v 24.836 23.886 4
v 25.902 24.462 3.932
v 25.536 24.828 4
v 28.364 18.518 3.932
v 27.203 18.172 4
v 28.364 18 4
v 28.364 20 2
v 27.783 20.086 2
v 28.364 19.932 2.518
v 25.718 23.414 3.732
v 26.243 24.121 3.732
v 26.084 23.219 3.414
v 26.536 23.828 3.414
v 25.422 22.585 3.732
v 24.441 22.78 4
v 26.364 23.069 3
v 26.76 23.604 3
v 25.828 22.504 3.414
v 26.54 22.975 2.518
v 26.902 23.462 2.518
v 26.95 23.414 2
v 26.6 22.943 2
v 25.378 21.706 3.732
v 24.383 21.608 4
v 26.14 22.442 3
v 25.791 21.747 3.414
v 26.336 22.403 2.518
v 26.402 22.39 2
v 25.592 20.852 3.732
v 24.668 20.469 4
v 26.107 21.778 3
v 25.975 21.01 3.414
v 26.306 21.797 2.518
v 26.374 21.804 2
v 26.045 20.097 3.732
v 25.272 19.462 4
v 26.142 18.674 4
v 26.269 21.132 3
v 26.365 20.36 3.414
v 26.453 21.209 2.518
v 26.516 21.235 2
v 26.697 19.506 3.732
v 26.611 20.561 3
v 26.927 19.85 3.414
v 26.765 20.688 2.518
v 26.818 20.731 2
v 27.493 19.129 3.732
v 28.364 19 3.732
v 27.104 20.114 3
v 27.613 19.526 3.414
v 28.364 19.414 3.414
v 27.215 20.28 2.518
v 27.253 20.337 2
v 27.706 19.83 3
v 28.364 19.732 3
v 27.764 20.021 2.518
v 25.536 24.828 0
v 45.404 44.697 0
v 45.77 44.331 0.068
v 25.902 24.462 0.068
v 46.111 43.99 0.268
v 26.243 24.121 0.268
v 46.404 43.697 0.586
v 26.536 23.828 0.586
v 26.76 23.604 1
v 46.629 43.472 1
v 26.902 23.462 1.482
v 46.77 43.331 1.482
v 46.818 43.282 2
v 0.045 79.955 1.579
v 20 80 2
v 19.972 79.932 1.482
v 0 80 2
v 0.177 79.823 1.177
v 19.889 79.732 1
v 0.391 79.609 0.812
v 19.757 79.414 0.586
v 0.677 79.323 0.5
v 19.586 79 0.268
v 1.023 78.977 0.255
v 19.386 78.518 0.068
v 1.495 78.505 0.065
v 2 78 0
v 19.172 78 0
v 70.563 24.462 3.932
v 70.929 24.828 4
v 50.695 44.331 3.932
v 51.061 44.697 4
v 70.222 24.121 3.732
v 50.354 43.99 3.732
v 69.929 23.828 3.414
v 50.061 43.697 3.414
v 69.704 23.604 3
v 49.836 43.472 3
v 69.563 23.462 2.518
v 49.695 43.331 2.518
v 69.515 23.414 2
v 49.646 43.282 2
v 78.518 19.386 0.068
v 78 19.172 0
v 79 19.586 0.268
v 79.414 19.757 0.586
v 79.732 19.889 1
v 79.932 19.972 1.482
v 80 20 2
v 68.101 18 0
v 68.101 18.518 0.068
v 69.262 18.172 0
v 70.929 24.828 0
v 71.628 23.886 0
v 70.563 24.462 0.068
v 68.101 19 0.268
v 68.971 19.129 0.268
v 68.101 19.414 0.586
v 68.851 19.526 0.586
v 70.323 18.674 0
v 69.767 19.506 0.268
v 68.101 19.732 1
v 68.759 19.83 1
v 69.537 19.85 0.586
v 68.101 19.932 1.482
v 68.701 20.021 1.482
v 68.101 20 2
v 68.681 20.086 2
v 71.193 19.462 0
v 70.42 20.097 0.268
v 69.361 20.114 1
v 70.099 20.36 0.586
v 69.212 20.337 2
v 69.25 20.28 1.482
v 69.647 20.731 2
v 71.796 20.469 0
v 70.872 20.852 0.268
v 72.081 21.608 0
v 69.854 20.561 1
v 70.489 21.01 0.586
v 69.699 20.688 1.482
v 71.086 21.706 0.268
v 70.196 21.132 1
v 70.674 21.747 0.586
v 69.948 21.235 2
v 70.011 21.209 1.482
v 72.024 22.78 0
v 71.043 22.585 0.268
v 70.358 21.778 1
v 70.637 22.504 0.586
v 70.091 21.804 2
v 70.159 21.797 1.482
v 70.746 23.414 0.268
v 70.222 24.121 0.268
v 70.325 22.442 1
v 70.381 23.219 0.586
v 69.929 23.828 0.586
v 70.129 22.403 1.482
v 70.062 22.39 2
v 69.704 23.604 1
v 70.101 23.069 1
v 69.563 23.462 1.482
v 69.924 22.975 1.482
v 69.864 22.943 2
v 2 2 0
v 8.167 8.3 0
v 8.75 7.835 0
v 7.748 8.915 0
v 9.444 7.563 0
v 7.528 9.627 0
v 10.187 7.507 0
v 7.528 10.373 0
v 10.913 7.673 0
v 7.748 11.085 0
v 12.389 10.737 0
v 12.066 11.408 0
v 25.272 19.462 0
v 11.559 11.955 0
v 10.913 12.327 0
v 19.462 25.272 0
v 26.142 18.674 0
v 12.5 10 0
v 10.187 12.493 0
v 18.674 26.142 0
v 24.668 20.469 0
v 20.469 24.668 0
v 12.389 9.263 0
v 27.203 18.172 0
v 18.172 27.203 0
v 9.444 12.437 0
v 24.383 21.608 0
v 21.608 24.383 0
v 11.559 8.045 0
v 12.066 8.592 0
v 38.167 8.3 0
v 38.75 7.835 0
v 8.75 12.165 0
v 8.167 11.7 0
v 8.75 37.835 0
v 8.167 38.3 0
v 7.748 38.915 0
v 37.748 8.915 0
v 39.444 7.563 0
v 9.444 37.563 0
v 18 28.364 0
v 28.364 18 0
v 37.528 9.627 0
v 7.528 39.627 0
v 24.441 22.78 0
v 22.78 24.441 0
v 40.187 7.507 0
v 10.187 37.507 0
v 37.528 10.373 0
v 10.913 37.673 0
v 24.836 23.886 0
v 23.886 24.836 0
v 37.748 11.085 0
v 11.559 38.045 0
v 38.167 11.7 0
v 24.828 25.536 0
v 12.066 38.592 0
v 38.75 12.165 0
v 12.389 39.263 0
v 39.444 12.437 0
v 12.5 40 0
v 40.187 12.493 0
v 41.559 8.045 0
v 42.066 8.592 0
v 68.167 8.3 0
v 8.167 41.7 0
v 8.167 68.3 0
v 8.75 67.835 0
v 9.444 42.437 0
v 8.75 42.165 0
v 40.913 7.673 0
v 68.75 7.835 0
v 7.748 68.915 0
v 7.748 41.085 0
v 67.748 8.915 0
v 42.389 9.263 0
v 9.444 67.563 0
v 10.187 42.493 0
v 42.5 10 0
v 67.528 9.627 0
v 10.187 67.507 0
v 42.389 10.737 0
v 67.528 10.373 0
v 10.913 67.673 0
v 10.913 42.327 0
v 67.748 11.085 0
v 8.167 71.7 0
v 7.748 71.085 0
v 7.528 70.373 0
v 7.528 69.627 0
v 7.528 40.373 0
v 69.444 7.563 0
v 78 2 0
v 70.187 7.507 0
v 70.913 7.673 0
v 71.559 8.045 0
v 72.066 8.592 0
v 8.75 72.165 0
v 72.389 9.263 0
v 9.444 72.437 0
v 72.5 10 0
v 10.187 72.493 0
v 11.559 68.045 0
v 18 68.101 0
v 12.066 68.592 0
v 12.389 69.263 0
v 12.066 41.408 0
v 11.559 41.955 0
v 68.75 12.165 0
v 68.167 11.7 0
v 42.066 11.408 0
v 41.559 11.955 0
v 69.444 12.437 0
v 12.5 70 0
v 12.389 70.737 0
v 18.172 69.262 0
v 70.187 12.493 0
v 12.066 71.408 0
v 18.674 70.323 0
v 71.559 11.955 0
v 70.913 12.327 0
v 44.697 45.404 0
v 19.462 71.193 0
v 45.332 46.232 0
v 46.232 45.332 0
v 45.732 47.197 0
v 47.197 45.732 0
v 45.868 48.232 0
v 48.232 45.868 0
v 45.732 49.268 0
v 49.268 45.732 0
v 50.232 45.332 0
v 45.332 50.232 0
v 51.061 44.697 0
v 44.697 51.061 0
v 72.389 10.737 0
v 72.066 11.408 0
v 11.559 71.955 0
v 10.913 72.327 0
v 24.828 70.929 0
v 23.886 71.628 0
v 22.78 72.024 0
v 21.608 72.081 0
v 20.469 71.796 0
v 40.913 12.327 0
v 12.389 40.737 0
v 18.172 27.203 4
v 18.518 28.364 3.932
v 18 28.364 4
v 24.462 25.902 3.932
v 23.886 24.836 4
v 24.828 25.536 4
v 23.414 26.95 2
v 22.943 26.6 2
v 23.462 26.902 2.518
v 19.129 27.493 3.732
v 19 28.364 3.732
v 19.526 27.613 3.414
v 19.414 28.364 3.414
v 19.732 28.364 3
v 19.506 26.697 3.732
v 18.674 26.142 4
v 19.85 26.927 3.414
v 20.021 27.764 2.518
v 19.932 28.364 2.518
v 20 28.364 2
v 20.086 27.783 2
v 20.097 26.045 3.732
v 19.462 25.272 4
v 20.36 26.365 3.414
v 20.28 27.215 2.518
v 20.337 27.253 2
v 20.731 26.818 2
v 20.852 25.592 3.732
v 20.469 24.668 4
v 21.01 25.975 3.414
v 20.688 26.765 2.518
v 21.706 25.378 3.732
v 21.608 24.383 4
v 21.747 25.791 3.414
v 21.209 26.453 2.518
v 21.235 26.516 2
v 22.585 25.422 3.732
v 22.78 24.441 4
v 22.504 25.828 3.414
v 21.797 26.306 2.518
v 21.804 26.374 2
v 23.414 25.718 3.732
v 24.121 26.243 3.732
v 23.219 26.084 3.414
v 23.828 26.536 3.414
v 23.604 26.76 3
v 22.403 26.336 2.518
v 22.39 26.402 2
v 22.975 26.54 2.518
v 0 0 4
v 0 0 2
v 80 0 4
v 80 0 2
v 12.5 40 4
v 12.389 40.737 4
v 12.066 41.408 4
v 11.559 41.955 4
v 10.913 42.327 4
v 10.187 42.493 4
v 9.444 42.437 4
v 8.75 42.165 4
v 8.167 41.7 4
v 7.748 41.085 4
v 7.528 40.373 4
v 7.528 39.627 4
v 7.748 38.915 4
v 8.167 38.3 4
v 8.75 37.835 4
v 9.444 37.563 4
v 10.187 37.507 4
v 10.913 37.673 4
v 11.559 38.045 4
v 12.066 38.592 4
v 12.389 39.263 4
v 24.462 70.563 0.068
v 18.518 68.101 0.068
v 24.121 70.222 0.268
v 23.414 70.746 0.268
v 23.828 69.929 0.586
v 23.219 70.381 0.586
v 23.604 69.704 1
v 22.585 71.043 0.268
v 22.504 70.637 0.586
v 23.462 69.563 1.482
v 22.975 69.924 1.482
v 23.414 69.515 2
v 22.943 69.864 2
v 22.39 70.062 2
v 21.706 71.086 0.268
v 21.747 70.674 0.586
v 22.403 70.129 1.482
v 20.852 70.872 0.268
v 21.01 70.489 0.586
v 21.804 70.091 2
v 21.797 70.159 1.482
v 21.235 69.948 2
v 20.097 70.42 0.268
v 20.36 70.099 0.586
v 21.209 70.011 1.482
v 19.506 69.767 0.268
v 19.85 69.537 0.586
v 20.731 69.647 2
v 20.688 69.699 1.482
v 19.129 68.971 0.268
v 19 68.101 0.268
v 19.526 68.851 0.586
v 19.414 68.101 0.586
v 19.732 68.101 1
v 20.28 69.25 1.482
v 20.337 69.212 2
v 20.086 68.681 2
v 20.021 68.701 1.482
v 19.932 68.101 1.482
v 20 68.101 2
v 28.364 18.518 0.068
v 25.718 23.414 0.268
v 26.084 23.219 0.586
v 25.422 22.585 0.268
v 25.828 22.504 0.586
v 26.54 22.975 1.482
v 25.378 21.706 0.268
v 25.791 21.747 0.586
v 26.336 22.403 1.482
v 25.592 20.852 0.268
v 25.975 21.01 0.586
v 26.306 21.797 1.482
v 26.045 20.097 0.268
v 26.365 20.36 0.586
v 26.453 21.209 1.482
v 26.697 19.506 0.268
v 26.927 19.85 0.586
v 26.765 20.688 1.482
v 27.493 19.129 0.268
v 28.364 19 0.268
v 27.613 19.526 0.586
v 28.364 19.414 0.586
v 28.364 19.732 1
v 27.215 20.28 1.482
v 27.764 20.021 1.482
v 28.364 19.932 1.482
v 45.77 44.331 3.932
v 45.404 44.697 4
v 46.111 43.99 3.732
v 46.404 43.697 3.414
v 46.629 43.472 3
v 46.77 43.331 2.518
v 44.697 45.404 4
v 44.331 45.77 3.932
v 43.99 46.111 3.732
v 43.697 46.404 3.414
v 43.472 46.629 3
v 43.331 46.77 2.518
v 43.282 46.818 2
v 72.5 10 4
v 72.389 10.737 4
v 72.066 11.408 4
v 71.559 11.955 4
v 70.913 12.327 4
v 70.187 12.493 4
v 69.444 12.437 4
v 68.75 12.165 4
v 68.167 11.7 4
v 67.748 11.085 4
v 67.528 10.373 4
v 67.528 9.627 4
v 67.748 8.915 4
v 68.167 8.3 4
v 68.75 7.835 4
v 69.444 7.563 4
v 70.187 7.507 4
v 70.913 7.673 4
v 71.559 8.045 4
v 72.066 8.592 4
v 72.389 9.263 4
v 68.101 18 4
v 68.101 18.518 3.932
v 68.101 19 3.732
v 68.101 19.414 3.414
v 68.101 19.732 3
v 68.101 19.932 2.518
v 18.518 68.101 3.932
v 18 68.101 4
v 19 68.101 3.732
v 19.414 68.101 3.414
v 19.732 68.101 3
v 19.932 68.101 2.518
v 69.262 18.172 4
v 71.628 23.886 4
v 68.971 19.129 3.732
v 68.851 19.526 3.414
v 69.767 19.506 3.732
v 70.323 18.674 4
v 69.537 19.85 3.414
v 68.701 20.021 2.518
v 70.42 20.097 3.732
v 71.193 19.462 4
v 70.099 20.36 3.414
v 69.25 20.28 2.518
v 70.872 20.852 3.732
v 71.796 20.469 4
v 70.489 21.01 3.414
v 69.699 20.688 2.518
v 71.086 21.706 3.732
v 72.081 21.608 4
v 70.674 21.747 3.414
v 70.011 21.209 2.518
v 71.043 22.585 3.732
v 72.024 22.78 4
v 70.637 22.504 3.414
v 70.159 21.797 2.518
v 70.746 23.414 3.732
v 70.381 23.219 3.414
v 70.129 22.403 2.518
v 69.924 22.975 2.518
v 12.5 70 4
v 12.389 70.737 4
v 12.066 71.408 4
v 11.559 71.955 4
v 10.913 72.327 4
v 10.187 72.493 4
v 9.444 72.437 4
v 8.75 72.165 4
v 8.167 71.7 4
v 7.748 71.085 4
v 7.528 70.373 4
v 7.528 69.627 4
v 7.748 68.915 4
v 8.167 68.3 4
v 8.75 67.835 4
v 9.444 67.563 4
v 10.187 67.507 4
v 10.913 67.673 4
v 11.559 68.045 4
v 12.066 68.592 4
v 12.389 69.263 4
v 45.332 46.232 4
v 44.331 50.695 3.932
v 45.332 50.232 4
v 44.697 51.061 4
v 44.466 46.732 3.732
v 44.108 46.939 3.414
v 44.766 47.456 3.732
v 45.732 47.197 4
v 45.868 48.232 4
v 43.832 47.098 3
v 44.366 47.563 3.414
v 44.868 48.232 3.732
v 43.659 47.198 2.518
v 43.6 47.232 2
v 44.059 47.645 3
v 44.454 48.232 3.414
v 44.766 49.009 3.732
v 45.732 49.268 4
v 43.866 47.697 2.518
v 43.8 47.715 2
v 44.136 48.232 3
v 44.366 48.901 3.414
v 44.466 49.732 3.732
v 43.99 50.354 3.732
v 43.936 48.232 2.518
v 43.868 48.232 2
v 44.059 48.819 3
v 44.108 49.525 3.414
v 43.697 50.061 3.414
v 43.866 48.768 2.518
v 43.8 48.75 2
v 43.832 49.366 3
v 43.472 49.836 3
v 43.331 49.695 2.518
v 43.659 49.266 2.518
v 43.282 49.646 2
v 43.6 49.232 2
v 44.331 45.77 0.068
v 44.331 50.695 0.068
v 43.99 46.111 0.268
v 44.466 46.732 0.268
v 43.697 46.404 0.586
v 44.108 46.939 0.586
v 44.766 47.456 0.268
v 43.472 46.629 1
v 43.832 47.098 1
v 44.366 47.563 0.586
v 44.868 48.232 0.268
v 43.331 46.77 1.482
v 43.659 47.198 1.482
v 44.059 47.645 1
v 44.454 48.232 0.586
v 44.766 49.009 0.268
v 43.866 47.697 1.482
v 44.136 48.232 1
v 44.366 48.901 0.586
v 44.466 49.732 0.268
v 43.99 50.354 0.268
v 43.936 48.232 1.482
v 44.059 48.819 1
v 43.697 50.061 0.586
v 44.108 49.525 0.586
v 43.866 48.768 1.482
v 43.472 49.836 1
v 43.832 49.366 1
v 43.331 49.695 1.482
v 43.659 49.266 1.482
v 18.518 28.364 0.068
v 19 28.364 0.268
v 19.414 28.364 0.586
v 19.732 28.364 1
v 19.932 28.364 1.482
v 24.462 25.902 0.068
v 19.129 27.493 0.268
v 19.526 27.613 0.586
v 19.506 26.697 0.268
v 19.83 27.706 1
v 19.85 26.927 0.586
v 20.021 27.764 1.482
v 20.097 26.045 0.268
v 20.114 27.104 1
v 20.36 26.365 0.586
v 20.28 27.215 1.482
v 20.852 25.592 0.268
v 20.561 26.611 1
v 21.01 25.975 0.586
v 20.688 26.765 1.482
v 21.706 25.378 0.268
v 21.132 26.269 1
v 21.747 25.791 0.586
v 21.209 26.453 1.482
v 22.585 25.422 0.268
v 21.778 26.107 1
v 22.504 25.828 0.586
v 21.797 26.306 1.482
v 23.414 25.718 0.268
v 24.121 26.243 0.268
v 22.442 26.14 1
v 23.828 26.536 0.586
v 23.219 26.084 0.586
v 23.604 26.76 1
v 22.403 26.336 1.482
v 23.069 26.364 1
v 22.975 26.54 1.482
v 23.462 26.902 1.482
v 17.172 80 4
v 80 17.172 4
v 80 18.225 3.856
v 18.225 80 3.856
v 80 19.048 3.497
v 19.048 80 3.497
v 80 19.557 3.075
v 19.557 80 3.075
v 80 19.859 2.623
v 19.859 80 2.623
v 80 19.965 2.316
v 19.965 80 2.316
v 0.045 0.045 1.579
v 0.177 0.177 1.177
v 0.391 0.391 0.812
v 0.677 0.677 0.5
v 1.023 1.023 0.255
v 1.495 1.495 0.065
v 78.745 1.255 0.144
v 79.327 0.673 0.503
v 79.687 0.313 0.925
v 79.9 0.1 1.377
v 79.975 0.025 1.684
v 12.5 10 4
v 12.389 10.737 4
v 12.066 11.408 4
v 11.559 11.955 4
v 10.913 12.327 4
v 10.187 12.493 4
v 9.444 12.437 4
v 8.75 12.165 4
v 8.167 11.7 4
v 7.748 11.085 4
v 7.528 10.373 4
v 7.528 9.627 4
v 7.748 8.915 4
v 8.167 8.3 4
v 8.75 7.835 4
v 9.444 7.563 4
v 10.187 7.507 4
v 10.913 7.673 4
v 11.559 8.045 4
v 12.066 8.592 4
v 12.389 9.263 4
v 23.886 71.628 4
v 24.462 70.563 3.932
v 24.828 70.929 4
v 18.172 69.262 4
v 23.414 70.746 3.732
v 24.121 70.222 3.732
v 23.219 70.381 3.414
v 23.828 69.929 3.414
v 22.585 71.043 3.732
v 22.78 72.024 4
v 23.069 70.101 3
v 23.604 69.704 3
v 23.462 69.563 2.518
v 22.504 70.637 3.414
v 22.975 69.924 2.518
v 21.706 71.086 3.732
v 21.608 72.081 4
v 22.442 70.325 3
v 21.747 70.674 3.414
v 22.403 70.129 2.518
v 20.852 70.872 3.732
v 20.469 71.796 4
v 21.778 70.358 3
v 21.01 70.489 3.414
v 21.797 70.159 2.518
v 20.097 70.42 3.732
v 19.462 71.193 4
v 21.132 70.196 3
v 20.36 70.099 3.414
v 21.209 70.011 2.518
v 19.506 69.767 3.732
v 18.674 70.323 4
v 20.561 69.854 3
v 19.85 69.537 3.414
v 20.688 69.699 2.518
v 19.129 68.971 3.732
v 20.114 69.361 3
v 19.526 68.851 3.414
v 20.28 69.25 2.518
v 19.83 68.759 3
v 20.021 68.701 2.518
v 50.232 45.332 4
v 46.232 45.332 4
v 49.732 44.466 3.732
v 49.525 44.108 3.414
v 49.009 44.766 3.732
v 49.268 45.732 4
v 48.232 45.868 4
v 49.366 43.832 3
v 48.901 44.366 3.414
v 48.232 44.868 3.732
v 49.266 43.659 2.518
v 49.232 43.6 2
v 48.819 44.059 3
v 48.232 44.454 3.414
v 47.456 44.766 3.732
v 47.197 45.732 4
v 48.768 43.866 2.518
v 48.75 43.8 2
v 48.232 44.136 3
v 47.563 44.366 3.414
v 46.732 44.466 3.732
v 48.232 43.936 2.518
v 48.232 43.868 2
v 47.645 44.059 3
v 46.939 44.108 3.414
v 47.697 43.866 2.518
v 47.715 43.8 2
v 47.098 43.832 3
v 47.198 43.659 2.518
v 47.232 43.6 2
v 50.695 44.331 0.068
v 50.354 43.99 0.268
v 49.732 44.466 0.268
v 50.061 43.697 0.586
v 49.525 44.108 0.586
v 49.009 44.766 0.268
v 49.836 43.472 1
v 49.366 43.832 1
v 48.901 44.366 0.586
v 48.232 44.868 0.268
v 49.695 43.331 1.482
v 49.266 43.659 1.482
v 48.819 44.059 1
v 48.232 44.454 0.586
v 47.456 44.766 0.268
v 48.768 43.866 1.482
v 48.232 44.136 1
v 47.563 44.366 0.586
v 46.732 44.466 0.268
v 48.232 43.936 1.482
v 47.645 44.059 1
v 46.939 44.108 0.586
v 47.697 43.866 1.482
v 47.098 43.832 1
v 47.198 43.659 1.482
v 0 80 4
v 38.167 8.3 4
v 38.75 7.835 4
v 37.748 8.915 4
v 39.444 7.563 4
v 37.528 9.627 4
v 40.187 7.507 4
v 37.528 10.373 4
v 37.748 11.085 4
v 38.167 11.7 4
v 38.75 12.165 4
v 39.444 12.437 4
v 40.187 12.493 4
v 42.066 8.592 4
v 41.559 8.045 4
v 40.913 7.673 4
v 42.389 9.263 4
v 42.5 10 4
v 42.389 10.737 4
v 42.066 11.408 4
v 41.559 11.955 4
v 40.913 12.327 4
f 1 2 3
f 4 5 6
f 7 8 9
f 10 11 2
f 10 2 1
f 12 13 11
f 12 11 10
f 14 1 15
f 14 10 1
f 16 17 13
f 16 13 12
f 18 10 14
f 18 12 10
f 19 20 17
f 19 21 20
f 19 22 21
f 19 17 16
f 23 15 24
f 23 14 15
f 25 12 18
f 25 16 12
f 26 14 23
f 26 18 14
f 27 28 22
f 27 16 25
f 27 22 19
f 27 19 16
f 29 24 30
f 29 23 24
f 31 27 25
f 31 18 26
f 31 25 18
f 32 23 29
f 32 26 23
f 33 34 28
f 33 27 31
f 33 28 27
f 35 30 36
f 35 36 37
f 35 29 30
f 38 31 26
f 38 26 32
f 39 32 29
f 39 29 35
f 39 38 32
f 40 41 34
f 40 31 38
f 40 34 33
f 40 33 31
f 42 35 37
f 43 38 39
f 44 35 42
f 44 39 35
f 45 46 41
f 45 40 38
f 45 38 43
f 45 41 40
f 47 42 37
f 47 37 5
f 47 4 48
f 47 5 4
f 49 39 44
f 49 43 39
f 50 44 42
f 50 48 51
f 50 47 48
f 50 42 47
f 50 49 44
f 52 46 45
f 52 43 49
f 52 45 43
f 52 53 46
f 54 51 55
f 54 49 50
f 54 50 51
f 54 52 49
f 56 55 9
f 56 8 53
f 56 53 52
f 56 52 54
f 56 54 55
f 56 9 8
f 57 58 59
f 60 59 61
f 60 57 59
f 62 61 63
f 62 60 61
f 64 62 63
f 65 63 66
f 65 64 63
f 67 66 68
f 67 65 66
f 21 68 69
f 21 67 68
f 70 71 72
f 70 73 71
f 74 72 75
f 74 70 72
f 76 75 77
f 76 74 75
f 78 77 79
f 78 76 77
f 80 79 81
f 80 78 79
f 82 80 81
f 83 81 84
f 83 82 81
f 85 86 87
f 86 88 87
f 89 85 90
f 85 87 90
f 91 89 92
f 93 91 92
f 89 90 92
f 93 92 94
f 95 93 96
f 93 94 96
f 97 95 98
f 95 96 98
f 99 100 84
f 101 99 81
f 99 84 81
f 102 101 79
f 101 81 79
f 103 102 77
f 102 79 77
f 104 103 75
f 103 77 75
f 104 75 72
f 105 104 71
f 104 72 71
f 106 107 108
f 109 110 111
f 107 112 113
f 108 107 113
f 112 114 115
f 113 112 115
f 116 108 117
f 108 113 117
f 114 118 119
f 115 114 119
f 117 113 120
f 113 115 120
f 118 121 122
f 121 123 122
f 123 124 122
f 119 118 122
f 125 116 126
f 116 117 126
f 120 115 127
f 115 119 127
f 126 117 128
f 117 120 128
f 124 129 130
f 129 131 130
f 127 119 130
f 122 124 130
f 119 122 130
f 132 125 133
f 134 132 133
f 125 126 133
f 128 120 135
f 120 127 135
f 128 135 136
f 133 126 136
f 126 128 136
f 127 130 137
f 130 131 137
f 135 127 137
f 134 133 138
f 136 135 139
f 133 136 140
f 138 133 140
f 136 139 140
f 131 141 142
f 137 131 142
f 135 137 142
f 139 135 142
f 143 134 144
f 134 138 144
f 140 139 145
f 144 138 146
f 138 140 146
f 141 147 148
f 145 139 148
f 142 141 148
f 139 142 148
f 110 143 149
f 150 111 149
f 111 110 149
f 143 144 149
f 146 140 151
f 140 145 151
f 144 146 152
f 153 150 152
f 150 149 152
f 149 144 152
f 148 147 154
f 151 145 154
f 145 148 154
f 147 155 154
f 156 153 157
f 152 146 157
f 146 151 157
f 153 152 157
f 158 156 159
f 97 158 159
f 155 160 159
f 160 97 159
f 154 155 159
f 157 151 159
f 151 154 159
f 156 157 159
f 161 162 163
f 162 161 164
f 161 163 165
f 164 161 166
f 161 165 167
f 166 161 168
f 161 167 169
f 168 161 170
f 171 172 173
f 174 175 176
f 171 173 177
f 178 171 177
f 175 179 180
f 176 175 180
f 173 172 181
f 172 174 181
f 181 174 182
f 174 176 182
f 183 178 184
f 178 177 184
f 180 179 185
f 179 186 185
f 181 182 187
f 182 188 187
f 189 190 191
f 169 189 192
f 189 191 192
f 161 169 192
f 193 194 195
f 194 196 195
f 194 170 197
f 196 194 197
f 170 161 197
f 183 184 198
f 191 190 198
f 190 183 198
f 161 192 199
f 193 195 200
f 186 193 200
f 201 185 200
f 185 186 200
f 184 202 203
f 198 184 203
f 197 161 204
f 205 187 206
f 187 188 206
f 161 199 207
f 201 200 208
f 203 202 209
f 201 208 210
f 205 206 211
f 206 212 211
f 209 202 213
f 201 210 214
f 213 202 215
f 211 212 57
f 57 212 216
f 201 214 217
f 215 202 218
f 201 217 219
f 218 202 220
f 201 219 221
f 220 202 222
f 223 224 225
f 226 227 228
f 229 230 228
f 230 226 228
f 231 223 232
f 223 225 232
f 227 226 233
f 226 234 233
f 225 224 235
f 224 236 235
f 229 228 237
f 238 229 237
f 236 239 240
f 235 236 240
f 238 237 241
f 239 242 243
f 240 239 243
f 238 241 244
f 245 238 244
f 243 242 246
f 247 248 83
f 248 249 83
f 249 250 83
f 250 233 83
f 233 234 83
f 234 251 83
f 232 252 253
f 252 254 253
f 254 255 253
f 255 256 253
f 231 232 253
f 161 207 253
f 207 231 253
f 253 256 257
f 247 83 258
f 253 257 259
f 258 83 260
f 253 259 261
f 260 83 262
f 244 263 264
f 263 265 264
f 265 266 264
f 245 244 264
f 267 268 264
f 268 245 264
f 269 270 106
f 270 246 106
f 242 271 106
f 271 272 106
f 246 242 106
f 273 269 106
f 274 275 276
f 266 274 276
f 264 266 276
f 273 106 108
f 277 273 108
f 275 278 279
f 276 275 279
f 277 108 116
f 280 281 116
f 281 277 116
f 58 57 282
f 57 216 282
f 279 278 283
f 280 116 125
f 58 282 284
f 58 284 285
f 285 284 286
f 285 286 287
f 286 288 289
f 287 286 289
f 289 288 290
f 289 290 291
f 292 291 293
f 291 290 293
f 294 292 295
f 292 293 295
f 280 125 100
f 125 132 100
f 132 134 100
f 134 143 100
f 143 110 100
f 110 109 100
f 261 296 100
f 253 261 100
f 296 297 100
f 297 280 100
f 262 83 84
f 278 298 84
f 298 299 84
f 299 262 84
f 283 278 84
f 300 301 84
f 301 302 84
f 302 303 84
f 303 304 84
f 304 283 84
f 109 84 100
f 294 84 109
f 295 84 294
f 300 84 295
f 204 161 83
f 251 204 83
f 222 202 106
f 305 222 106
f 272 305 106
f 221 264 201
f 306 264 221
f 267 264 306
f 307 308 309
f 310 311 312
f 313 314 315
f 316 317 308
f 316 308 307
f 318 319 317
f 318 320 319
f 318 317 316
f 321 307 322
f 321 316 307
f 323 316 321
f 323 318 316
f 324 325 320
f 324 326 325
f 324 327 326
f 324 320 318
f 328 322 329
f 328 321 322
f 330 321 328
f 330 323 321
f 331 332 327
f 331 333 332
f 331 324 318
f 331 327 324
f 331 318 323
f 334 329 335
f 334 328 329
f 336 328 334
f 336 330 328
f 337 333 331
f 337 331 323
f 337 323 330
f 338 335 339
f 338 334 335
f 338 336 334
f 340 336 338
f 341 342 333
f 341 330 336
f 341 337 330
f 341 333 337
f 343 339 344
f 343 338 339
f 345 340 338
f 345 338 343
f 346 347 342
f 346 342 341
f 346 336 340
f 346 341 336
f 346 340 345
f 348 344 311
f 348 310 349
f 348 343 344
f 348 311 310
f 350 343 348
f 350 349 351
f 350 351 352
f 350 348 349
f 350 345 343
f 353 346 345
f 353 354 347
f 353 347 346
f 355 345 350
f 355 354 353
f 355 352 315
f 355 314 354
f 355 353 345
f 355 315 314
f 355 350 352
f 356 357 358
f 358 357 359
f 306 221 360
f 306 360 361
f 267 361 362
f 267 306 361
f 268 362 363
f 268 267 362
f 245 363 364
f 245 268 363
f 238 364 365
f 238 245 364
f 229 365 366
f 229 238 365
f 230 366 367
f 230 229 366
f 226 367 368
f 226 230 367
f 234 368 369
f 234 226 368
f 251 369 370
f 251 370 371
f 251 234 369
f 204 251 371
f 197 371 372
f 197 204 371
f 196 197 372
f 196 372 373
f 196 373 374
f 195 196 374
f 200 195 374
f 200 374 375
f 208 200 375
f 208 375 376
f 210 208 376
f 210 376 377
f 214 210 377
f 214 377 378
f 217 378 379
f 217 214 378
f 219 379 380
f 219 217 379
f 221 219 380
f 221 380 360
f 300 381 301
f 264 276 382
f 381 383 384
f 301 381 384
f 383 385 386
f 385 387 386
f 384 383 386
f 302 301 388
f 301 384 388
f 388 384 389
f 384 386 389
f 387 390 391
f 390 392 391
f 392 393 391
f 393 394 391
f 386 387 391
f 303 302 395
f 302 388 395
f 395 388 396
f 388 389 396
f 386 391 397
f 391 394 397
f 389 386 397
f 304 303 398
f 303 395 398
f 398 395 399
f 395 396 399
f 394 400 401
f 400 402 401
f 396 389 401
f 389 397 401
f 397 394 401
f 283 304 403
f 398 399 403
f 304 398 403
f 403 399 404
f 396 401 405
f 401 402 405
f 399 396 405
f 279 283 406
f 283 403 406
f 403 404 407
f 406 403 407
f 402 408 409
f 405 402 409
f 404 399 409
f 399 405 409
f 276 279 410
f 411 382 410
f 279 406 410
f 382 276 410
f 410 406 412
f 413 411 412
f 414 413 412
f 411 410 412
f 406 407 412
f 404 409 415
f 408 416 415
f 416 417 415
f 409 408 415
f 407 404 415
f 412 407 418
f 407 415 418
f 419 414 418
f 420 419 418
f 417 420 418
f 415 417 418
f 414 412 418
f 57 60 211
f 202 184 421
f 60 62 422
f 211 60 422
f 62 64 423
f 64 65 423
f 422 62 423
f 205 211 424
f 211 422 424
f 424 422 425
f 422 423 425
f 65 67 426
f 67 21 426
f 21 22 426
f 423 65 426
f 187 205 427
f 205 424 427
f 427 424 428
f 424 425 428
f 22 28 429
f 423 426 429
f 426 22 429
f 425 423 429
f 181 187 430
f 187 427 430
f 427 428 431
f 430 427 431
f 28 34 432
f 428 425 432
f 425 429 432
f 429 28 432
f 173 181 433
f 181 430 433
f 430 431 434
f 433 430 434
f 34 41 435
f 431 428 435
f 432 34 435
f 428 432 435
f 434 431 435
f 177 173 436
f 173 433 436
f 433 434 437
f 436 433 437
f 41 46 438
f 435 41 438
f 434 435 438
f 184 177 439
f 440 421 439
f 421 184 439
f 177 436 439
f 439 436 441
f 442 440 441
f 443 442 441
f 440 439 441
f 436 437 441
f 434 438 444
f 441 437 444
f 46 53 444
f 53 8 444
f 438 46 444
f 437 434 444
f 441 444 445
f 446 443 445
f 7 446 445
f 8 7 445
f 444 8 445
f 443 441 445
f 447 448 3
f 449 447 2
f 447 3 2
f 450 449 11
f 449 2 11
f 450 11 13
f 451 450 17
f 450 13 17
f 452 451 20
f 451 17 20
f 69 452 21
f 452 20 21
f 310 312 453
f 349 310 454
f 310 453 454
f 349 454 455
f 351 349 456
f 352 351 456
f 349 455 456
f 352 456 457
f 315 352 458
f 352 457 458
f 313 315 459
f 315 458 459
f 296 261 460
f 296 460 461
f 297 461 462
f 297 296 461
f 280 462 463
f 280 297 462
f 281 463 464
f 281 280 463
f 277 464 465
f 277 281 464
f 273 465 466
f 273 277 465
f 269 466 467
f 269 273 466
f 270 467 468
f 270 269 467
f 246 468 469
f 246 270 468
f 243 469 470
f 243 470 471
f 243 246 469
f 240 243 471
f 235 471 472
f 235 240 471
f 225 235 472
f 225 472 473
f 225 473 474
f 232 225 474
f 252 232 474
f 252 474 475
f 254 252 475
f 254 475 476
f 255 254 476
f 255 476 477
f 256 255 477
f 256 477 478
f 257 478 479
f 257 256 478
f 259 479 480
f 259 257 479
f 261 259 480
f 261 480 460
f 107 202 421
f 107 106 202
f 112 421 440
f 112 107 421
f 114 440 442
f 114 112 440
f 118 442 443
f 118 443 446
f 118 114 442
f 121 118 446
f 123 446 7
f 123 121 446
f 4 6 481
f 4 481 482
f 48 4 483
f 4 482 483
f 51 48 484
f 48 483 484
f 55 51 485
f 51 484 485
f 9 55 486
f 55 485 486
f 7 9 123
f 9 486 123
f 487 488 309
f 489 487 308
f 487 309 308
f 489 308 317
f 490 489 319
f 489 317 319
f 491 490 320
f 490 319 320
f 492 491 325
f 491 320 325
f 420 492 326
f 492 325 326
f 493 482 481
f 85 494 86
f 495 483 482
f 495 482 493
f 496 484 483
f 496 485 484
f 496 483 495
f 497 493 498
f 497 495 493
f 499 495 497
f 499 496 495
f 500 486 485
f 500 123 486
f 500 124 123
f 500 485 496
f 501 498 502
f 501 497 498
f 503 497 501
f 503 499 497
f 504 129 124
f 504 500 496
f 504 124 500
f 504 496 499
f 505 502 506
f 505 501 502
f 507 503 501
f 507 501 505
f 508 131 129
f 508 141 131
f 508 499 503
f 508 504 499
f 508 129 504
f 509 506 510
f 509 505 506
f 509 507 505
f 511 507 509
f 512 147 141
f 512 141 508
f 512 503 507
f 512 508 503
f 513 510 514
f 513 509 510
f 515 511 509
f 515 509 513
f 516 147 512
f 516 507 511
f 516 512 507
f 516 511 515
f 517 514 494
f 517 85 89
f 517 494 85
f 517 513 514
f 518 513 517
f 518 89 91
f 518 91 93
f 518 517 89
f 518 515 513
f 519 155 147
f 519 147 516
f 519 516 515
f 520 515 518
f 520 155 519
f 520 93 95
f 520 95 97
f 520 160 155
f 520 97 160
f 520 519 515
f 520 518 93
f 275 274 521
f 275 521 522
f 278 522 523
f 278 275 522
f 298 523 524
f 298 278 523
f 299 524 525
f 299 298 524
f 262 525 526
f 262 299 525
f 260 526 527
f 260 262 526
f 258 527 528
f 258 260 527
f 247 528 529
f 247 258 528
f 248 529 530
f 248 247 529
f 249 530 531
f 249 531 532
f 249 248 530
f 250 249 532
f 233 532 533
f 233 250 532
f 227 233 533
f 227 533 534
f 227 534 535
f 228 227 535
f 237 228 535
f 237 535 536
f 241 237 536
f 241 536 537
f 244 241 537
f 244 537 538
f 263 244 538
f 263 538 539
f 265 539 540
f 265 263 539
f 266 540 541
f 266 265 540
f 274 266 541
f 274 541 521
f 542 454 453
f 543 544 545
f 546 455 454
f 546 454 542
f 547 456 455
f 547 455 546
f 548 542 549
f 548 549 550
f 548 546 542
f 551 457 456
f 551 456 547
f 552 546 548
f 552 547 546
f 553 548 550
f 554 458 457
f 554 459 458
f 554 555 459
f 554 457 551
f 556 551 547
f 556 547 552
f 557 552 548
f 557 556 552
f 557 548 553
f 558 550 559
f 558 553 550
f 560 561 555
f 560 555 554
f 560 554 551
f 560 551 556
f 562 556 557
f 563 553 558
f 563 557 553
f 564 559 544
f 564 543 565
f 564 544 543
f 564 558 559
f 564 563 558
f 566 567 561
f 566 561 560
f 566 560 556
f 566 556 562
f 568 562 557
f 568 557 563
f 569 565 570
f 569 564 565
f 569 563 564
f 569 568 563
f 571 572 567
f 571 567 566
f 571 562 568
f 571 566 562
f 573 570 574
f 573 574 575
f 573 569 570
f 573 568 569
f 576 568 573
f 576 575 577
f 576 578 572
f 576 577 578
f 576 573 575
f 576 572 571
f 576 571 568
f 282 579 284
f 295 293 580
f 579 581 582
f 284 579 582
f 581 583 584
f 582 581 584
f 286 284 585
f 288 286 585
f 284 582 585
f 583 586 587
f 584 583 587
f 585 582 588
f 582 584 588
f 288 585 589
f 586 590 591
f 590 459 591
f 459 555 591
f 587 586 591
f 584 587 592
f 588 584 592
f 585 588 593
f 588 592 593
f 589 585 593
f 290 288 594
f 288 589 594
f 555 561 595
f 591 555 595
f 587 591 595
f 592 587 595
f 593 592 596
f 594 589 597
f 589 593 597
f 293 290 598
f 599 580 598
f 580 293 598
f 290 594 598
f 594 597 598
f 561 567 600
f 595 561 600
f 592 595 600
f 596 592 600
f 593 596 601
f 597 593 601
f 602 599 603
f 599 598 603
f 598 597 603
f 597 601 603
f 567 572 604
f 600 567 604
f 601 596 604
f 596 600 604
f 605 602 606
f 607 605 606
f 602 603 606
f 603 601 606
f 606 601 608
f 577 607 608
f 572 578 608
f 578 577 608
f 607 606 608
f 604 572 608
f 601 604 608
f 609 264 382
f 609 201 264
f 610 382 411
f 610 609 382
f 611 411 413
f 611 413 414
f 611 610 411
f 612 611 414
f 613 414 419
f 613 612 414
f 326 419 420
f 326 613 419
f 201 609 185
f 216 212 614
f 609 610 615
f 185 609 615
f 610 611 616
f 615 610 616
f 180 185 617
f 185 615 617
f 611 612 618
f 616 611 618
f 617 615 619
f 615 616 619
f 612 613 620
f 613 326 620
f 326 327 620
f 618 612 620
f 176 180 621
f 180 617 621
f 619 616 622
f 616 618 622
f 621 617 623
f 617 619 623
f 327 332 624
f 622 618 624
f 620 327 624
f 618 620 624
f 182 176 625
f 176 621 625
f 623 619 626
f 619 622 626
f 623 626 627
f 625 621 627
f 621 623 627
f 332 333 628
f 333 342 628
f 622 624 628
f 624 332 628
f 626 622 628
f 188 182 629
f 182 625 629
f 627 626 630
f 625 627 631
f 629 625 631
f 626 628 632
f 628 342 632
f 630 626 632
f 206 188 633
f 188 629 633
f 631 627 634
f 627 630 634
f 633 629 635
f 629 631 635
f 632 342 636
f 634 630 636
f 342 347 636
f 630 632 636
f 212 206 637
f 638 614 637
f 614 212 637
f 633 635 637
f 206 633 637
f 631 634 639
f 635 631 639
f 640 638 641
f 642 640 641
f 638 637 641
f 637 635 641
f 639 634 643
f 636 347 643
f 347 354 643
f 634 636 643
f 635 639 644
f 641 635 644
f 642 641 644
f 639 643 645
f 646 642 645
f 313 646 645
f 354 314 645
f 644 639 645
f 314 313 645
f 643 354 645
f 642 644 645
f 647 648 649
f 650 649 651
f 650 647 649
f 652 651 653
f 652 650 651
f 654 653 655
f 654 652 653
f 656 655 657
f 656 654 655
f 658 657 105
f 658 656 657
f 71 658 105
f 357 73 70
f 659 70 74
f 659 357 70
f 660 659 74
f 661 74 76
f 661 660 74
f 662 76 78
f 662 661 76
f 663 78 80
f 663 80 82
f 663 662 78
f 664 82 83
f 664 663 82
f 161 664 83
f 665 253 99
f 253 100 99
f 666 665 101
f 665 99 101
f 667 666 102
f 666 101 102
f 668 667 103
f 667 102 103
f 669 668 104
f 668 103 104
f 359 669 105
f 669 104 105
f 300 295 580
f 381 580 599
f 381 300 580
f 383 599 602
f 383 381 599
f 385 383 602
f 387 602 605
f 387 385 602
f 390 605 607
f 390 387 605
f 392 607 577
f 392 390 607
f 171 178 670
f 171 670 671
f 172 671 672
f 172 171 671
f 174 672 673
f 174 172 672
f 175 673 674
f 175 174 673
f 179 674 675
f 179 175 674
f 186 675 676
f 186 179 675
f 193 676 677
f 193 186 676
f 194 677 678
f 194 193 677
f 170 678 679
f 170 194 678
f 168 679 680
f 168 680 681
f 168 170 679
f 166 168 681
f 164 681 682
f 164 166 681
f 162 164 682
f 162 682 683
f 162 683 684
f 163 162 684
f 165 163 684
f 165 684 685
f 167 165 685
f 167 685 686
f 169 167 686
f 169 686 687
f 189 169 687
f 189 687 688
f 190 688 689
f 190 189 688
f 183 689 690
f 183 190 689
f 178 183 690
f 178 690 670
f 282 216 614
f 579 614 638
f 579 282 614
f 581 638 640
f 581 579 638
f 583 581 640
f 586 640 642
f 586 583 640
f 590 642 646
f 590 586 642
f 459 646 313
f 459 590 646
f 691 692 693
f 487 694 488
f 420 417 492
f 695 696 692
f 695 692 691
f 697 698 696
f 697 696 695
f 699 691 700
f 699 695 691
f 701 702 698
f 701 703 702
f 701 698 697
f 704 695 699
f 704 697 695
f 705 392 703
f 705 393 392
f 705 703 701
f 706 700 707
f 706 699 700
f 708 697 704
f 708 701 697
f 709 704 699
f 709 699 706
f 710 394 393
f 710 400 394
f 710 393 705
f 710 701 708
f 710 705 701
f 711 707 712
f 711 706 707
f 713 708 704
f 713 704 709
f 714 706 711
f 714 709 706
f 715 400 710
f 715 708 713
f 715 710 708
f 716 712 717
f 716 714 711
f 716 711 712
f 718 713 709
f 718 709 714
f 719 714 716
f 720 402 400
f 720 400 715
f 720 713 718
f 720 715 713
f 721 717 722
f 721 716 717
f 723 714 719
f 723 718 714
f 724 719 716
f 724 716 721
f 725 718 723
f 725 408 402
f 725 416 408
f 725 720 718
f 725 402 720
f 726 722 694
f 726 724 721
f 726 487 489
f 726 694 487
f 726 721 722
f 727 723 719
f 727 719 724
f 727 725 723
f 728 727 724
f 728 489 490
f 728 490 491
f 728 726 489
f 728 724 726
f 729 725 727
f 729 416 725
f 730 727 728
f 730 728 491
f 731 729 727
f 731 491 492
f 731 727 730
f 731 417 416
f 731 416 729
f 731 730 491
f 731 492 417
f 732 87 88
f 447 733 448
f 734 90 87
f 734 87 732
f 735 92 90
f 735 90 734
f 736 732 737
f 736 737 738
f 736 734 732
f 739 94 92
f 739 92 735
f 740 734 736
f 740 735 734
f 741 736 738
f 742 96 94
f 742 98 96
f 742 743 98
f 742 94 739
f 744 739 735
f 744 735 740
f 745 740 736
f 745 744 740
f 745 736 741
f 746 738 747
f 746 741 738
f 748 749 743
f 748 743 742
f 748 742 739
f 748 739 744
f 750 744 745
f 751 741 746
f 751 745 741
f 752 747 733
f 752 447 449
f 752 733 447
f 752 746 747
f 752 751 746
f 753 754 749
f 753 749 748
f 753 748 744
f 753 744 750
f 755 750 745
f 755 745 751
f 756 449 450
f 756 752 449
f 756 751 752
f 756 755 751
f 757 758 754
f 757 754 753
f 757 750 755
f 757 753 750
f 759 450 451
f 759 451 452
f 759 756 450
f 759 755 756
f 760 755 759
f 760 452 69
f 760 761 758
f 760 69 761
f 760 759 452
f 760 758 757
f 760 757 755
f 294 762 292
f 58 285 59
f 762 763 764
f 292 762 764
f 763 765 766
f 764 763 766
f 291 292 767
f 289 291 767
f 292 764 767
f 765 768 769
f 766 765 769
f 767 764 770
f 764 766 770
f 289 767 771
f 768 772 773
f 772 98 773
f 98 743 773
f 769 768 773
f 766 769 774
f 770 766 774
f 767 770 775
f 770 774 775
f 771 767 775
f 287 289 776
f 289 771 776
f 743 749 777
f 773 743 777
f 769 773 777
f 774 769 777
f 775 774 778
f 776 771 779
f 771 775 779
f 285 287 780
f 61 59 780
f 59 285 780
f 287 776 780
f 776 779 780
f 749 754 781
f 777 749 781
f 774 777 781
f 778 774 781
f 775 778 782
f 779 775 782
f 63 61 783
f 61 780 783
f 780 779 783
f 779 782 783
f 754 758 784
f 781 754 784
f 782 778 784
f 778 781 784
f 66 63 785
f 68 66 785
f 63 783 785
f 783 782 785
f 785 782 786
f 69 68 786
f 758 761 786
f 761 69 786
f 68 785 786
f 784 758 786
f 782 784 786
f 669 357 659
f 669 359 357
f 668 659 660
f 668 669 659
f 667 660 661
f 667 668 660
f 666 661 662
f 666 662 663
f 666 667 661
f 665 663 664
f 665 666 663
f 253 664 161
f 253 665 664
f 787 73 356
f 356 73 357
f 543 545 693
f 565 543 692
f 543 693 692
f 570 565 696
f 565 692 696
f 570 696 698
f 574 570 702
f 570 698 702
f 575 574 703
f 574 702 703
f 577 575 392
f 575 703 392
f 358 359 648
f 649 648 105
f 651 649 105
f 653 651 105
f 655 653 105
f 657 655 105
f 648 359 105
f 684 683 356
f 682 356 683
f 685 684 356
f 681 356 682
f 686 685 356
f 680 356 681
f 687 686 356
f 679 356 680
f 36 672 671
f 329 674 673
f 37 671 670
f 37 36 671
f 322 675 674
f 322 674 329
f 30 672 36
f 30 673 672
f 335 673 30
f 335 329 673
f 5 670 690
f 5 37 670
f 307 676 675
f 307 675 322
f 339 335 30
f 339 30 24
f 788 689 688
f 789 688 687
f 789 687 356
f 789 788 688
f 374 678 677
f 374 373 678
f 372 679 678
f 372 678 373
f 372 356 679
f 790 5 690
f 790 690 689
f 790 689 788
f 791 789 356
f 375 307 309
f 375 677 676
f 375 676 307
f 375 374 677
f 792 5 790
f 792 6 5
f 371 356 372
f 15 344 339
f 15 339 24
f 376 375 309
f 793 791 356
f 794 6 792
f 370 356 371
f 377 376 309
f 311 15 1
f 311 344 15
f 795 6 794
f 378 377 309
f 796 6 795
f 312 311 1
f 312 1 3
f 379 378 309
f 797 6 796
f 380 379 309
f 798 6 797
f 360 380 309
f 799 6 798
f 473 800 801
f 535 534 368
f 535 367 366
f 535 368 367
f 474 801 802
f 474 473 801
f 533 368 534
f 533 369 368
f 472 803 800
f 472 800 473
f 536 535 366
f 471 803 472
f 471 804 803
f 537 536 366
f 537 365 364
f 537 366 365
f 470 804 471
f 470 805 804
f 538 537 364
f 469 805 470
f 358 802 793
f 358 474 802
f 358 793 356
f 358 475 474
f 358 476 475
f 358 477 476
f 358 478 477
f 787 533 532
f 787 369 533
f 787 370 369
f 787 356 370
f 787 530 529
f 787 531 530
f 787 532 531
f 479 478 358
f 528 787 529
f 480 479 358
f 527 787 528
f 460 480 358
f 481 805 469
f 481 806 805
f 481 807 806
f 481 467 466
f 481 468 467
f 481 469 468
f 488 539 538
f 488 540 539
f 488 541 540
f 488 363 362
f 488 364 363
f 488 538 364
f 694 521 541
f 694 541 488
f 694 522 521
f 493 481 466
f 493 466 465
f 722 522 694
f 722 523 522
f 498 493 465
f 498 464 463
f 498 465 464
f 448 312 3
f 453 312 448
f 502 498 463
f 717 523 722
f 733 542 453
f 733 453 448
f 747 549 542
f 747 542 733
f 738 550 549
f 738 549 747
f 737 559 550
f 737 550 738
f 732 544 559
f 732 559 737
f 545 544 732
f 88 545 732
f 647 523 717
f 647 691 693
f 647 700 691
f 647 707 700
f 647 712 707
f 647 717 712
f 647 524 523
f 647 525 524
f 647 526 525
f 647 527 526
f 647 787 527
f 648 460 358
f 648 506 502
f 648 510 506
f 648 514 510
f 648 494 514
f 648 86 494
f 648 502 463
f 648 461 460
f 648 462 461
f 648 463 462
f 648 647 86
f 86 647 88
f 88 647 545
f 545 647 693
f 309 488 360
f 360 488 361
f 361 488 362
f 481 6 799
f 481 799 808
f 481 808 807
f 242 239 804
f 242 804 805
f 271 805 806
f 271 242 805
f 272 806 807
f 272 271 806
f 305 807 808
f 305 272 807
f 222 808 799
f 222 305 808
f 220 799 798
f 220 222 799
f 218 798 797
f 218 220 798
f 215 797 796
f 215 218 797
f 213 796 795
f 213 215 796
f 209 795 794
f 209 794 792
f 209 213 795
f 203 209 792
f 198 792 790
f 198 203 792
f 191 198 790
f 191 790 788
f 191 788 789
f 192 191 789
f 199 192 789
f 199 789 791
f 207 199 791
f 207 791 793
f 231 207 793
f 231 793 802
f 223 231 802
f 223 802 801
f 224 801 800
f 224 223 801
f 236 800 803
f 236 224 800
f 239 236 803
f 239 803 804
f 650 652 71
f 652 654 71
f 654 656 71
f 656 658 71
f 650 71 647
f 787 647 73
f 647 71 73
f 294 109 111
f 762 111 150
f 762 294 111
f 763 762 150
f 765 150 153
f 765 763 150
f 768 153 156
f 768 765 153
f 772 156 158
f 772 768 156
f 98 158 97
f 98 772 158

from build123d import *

# Parameters (mm, degrees)
F0_R     = 2.5
F1_DEPTH = 4
F3_DEPTH = 25
F4_R     = 2
F5_R     = 1.99999


# Not quite as in the source:
# - a fillet or chamfer is up to 0.001 mm smaller than in the source, because OpenCascade refuses the exact size


with BuildPart() as f1:
    # F0 (on Top) → F1 (new body)
    with BuildSketch(Plane.XY):
        Polygon((0, 80), (0, 0), (80, 0), (80, 20), (20, 80), align=None)
        with Locations((10, 10)):
            Circle(F0_R, mode=Mode.SUBTRACT)
        with Locations((40, 10)):
            Circle(F0_R, mode=Mode.SUBTRACT)
        with Locations((70, 10)):
            Circle(F0_R, mode=Mode.SUBTRACT)
        with Locations((10, 40)):
            Circle(F0_R, mode=Mode.SUBTRACT)
        with Locations((10, 70)):
            Circle(F0_R, mode=Mode.SUBTRACT)
    extrude(amount=F1_DEPTH)

    # F2 (on face) → F3 (cut)
    with BuildSketch(Plane.XY.offset(4)):
        Polygon((44.6966991411, 48.232233047), (20, 72.9289321881), (20, 23.5355339059), align=None)
        Polygon((23.5355339059, 20), (72.9289321881, 20), (48.232233047, 44.6966991411), align=None)
    extrude(amount=-F3_DEPTH, mode=Mode.SUBTRACT)

    # F4
    f4_edges = [f1.edges().sort_by_distance(p)[0] for p in [
        (80, 10, 0),
        (50, 50, 0),
        (10, 80, 0),
        (0, 40, 0),
        (40, 0, 0),
        (72.928932, 20, 2),
        (48.232233, 44.696699, 2),
        (23.535534, 20, 2),
        (44.696699, 48.232233, 2),
        (20, 23.535534, 2),
        (20, 72.928932, 2),
    ]]
    fillet(f4_edges, radius=F4_R)

    # F5 (radius 2 in the source; OpenCascade refuses exactly that, so slightly less here)
    f5_edges = [f1.edges().sort_by_distance(p)[0] for p in [
        (48.232233, 20, 0),
        (20, 48.232233, 0),
        (50, 50, 4),
        (33.34835, 36.883883, 4),
        (59.580583, 33.34835, 4),
    ]]
    fillet(f5_edges, radius=F5_R)


solid = f1.part
